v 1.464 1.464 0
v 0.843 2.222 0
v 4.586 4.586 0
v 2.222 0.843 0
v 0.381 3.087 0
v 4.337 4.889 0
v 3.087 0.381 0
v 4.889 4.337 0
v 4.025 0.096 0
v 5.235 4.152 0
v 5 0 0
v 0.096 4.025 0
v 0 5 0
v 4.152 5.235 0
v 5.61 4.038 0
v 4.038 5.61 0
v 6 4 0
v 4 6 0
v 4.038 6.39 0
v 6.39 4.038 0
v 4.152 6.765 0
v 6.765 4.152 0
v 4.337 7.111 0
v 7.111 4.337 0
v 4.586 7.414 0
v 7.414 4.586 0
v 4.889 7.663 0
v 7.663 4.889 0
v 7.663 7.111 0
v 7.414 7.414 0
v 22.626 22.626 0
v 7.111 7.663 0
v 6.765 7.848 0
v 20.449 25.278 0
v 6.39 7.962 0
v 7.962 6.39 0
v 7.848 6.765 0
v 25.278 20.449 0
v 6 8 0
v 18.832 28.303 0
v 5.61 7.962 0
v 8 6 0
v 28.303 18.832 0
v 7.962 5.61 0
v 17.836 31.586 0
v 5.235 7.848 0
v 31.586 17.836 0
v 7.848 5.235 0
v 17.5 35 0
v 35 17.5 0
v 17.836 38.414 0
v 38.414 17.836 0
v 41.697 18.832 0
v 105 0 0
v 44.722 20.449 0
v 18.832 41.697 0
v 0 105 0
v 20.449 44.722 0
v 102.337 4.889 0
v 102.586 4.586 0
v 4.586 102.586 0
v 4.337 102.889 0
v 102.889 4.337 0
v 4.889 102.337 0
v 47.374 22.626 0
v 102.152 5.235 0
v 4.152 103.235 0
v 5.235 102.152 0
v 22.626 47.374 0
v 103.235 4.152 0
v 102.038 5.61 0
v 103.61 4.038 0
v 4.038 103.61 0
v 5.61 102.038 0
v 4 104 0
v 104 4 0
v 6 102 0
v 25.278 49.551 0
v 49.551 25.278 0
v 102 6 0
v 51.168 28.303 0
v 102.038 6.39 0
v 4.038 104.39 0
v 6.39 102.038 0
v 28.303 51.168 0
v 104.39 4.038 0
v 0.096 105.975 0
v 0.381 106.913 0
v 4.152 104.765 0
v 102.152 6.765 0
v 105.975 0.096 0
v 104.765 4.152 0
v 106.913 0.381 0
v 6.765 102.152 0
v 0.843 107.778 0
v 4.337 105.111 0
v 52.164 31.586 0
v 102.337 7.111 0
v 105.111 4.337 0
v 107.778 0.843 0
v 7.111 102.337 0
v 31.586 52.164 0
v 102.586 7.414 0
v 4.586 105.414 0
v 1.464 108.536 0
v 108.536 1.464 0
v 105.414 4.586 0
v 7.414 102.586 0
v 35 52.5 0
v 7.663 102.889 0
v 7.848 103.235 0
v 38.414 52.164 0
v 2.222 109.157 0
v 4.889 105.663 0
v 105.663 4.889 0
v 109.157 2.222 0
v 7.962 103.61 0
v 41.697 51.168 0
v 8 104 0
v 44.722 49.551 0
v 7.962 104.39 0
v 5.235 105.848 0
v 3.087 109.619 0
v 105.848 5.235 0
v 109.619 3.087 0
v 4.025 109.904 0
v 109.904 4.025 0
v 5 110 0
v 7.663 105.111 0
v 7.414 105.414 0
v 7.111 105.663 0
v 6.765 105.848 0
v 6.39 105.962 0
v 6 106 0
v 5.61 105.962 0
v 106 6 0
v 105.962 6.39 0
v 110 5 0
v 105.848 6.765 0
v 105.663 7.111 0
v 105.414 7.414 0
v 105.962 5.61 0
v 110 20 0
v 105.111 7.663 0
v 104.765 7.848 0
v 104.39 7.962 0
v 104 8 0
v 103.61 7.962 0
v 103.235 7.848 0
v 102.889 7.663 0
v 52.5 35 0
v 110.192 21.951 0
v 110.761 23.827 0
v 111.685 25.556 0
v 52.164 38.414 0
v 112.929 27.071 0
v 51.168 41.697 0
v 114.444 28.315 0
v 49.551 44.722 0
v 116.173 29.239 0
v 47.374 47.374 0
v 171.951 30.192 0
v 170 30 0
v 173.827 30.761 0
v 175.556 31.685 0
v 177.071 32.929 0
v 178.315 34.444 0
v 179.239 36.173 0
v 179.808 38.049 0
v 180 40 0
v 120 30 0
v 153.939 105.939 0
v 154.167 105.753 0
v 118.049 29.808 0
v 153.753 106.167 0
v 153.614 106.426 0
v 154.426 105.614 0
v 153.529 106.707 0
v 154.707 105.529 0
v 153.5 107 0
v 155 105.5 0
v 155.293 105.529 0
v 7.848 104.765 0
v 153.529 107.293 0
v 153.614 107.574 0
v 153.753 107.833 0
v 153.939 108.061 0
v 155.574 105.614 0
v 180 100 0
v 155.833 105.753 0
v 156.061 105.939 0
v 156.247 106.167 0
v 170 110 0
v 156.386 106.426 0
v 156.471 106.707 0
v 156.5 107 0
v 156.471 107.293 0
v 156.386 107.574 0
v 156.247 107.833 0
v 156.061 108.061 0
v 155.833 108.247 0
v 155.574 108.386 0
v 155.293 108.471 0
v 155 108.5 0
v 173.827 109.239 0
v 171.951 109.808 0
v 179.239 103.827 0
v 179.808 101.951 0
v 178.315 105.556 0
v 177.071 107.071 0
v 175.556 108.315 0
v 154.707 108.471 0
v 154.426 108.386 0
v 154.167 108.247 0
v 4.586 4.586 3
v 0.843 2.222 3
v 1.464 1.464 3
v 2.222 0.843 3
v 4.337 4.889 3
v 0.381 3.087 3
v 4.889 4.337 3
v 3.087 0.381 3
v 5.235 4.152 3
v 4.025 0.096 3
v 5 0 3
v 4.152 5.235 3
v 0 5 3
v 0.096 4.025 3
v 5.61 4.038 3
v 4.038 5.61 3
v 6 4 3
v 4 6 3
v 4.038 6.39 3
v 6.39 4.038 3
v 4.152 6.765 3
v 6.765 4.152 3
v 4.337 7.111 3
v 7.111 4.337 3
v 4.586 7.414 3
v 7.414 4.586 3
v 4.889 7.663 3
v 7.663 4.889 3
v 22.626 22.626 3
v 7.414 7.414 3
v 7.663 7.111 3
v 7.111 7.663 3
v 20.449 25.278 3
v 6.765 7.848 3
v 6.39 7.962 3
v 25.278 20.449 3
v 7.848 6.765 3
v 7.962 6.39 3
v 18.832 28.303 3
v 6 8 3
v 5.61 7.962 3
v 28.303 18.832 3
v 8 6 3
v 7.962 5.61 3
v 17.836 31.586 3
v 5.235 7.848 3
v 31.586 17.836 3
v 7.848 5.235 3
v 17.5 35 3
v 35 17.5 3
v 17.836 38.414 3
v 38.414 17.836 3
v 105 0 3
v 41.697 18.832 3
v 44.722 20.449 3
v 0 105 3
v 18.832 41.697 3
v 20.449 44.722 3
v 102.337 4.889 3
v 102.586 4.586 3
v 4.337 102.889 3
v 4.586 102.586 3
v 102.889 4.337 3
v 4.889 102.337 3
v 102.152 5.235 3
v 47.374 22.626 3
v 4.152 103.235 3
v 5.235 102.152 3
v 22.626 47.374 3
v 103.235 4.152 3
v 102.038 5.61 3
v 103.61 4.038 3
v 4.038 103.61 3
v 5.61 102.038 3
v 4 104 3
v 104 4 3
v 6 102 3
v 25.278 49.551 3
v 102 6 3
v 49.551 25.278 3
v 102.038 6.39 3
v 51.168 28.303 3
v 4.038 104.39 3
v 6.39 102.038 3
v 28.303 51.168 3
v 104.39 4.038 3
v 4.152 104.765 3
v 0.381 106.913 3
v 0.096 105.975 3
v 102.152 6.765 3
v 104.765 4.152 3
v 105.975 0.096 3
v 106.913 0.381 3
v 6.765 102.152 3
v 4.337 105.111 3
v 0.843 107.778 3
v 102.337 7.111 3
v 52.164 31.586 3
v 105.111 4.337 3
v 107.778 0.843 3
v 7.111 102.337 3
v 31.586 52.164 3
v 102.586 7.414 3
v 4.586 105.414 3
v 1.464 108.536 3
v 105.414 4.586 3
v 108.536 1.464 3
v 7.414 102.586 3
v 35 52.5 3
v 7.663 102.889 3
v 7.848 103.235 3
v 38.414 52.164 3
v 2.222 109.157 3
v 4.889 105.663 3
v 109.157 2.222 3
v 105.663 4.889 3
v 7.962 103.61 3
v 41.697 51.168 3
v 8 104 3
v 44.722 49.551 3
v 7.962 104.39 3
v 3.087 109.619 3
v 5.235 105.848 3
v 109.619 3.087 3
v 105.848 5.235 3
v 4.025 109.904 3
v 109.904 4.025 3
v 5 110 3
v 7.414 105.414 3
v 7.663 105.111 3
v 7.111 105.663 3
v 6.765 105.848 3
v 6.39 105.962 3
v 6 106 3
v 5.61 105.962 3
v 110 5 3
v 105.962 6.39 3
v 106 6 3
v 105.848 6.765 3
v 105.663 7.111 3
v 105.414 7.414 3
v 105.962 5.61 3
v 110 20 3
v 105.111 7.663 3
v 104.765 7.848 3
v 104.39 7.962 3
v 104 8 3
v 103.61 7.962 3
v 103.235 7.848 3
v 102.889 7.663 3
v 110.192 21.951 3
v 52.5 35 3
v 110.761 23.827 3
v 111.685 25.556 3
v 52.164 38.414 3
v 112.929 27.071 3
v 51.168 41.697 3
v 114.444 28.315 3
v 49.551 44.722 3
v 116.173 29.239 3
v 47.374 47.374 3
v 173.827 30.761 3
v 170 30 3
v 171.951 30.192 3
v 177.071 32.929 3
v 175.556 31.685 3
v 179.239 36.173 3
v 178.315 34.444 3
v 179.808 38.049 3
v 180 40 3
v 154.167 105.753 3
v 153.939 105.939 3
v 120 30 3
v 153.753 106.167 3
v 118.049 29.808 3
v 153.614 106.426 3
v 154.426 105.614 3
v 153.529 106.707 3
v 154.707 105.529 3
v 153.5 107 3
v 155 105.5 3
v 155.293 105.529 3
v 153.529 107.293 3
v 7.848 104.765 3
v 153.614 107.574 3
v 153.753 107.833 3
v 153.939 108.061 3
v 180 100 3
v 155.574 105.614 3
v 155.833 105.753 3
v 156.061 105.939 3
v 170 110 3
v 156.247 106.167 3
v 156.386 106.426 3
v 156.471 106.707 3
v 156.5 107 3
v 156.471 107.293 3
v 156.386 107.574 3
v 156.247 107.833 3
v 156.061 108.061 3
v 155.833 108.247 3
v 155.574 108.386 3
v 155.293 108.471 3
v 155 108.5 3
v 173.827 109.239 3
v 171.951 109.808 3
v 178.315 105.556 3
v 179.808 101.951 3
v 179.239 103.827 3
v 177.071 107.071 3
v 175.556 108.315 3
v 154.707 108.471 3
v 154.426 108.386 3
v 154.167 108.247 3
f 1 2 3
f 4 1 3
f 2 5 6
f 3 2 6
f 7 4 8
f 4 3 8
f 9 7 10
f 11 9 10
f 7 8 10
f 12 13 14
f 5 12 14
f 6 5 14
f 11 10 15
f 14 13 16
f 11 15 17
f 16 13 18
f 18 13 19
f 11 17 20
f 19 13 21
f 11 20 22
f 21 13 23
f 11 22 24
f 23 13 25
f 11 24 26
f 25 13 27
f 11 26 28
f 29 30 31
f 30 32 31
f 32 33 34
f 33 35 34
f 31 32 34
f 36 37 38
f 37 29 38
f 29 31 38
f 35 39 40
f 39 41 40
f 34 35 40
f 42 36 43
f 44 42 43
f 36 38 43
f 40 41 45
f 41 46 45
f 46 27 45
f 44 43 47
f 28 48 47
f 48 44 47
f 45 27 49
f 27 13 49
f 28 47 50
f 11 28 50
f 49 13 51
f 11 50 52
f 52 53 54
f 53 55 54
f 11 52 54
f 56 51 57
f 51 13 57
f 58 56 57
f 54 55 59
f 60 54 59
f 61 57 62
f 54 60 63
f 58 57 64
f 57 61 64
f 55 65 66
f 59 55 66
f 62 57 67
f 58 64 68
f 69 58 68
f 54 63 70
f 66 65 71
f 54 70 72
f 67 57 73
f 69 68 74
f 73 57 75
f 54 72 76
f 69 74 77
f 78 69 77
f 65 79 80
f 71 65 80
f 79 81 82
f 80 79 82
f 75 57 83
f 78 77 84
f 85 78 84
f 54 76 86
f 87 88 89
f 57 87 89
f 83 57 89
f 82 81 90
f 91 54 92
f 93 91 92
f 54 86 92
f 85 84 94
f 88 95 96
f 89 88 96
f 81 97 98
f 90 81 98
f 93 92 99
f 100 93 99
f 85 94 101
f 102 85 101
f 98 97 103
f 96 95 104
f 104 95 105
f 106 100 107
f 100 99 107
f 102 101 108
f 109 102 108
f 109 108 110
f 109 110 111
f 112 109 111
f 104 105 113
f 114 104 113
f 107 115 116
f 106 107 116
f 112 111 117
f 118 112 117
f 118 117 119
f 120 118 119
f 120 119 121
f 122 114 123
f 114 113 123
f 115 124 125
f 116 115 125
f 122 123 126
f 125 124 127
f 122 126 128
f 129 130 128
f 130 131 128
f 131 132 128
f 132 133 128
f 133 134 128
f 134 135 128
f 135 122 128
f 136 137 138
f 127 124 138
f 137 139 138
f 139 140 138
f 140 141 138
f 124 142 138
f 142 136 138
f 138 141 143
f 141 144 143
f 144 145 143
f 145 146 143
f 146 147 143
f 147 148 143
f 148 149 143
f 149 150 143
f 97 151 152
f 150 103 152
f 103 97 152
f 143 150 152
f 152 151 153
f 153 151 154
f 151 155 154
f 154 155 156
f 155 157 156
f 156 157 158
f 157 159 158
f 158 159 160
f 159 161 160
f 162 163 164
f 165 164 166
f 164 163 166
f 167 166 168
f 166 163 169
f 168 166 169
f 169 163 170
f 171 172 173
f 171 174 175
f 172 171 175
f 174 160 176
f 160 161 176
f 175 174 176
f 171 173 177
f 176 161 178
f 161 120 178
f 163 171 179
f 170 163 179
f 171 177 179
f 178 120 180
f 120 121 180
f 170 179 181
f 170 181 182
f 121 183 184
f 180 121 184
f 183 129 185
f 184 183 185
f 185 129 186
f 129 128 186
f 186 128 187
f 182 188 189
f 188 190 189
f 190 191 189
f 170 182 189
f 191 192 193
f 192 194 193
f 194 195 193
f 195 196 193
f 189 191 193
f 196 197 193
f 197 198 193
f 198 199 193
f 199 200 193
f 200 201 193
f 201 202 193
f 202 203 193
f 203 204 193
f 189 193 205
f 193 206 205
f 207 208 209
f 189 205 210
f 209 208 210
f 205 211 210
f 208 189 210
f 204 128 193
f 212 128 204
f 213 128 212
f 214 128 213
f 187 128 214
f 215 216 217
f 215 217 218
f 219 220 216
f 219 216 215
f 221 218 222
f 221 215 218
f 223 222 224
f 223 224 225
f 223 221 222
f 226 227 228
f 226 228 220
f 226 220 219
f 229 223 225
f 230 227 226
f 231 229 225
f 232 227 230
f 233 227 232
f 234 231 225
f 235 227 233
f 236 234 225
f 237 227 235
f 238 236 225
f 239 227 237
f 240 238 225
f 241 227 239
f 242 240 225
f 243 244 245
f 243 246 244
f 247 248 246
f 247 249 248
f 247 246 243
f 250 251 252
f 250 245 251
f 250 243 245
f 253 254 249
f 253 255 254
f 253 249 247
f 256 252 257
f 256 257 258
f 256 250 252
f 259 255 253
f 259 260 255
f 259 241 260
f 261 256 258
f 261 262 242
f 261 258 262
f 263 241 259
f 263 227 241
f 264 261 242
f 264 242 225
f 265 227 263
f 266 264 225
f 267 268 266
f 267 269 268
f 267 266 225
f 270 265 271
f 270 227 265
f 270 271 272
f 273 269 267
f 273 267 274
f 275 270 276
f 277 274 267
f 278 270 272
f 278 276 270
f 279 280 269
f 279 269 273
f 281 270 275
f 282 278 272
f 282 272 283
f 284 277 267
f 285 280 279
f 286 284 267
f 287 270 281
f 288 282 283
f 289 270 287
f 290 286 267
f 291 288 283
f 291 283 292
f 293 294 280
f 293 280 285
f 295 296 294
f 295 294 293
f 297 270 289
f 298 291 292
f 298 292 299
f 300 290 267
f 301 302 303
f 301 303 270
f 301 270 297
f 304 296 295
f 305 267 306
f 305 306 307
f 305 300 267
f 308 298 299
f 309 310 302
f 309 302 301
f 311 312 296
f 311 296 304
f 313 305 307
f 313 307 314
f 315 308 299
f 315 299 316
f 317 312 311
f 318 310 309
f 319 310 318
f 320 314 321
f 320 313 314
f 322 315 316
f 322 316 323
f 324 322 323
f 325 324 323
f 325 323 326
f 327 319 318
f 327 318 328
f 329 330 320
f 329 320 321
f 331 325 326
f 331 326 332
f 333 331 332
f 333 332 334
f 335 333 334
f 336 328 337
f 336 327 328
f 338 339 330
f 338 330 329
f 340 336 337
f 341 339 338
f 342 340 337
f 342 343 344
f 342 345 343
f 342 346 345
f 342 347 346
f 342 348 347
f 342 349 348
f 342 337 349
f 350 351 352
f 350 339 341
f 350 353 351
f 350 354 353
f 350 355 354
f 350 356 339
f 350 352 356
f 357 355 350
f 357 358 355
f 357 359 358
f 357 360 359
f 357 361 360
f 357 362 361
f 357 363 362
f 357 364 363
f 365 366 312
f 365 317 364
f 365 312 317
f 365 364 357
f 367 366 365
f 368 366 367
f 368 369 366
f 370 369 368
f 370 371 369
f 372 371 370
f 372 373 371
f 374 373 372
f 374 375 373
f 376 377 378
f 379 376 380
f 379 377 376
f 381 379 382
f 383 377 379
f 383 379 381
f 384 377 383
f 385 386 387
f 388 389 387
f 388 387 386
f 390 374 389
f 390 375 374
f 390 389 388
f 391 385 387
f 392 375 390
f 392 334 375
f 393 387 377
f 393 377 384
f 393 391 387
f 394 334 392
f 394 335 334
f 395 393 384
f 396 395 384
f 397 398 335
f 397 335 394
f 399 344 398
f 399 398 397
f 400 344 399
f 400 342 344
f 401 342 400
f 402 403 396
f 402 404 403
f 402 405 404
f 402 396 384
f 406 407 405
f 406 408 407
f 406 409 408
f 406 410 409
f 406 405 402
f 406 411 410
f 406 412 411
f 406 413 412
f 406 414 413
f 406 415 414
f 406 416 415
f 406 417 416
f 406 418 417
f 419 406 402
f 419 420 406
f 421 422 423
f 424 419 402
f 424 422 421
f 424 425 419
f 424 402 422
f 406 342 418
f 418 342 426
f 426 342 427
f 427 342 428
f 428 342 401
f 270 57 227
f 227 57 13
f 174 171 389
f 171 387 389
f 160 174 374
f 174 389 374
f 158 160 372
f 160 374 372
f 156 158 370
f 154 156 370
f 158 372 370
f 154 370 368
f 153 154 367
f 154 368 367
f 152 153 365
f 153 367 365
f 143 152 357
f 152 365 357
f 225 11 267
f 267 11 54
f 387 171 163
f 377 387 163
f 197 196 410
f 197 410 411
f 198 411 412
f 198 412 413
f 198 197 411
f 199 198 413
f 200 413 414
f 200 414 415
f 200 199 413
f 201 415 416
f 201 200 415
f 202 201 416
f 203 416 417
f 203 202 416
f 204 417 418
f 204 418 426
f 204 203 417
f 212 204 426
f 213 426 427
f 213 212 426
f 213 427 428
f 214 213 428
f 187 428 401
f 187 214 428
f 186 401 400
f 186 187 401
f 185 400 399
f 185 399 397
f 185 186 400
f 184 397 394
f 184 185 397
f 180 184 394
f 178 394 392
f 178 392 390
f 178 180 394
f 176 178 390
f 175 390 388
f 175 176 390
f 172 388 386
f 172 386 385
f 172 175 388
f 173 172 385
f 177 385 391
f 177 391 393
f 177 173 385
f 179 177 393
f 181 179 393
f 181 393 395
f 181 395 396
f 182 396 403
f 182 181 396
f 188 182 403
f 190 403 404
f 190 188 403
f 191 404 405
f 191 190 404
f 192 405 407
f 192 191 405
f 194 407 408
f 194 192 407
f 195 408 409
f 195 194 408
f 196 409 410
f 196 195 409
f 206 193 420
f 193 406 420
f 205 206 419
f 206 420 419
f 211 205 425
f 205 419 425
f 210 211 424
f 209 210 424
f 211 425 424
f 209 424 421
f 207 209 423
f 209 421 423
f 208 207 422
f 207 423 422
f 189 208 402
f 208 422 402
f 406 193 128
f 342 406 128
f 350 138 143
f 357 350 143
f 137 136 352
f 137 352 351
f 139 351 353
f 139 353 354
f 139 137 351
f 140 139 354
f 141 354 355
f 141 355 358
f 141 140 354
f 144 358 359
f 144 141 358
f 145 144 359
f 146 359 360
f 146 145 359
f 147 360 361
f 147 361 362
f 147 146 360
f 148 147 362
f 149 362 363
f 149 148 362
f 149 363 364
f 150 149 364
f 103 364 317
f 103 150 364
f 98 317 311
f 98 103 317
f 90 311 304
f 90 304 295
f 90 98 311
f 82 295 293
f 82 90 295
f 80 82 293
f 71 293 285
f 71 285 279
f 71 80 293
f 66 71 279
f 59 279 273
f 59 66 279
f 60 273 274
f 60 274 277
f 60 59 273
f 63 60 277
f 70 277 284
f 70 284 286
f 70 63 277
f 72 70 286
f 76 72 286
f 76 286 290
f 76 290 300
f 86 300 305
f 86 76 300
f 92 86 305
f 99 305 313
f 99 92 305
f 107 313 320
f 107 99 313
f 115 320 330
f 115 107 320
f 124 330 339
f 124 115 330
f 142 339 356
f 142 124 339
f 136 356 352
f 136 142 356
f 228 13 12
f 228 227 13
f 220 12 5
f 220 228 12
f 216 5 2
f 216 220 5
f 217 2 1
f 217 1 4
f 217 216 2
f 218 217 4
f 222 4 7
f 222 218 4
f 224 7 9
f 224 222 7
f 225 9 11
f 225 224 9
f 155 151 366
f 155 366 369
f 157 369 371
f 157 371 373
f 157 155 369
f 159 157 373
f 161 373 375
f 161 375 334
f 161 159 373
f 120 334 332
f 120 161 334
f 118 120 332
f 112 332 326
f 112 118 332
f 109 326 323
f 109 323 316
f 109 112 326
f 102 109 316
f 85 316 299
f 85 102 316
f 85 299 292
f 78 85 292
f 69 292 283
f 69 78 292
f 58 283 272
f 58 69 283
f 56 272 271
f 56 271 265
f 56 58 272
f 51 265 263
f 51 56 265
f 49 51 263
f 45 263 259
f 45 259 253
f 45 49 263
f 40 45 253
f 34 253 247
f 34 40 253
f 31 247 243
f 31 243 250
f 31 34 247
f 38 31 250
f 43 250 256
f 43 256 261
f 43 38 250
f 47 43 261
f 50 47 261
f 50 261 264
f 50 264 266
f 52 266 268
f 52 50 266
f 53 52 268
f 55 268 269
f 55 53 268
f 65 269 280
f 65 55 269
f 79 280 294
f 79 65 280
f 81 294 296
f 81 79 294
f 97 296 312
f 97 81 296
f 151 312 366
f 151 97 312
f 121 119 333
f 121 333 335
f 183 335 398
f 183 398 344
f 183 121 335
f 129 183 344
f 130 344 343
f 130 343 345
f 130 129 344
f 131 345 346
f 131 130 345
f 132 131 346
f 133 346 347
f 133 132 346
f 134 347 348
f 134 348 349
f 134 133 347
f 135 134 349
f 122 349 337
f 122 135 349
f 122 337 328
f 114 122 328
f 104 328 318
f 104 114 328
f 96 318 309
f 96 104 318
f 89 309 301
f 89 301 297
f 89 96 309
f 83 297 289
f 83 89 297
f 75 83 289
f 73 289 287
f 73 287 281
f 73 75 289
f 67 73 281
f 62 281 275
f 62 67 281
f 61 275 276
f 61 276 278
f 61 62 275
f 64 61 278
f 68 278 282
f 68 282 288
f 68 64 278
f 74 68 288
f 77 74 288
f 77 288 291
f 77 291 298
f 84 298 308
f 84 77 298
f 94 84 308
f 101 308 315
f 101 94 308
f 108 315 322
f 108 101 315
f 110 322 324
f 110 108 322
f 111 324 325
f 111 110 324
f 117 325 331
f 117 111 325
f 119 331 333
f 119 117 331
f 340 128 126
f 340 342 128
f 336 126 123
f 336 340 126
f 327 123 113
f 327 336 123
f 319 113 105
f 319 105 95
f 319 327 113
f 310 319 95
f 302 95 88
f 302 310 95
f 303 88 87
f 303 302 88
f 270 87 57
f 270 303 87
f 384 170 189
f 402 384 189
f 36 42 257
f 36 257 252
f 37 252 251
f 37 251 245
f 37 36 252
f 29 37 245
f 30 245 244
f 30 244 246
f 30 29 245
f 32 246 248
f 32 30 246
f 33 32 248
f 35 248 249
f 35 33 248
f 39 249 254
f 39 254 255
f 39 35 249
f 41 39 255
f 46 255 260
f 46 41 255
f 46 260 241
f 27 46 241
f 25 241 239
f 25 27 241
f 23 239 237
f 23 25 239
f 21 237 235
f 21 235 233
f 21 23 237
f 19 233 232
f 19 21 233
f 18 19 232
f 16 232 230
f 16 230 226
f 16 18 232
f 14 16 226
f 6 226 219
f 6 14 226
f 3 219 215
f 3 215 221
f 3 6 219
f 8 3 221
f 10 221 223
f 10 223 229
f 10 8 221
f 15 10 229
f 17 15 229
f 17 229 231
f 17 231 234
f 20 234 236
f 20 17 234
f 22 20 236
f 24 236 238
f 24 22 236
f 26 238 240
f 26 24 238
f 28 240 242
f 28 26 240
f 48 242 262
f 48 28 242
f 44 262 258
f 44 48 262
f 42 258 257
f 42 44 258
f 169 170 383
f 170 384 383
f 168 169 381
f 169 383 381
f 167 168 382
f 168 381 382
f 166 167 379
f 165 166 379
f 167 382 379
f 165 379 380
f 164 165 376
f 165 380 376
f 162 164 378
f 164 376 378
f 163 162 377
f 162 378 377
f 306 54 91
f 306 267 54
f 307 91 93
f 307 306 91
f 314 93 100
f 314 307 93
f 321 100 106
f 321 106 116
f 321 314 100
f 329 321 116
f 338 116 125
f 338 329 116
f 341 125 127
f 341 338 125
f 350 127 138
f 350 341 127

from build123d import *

# Parameters (mm, degrees)
F0_R     = 2
F0_R_2   = 17.5
F0_R_3   = 1.5
F1_DEPTH = 3
F2_R     = 10
F3_R     = 5


with BuildPart() as f1:
    # F0 (on Top) → F1 (new body)
    with BuildSketch(Plane.XY):
        Polygon((180, 110), (0, 110), (0, 0), (110, 0), (110, 30), (180, 30), align=None)
        with Locations((6, 6)):
            Circle(F0_R, mode=Mode.SUBTRACT)
        with Locations((35, 35)):
            Circle(F0_R_2, mode=Mode.SUBTRACT)
        with Locations((104, 6)):
            Circle(F0_R, mode=Mode.SUBTRACT)
        with Locations((6, 104)):
            Circle(F0_R, mode=Mode.SUBTRACT)
        with Locations((155, 107)):
            Circle(F0_R_3, mode=Mode.SUBTRACT)
    extrude(amount=F1_DEPTH)

    # F2
    f2_edges = [f1.edges().sort_by_distance(p)[0] for p in [
        (110, 30, 1.5),
        (180, 30, 1.5),
        (180, 110, 1.5),
    ]]
    fillet(f2_edges, radius=F2_R)

    # F3
    f3_edges = [f1.edges().sort_by_distance(p)[0] for p in [
        (110, 0, 1.5),
        (0, 0, 1.5),
        (0, 110, 1.5),
    ]]
    fillet(f3_edges, radius=F3_R)


solid = f1.part
